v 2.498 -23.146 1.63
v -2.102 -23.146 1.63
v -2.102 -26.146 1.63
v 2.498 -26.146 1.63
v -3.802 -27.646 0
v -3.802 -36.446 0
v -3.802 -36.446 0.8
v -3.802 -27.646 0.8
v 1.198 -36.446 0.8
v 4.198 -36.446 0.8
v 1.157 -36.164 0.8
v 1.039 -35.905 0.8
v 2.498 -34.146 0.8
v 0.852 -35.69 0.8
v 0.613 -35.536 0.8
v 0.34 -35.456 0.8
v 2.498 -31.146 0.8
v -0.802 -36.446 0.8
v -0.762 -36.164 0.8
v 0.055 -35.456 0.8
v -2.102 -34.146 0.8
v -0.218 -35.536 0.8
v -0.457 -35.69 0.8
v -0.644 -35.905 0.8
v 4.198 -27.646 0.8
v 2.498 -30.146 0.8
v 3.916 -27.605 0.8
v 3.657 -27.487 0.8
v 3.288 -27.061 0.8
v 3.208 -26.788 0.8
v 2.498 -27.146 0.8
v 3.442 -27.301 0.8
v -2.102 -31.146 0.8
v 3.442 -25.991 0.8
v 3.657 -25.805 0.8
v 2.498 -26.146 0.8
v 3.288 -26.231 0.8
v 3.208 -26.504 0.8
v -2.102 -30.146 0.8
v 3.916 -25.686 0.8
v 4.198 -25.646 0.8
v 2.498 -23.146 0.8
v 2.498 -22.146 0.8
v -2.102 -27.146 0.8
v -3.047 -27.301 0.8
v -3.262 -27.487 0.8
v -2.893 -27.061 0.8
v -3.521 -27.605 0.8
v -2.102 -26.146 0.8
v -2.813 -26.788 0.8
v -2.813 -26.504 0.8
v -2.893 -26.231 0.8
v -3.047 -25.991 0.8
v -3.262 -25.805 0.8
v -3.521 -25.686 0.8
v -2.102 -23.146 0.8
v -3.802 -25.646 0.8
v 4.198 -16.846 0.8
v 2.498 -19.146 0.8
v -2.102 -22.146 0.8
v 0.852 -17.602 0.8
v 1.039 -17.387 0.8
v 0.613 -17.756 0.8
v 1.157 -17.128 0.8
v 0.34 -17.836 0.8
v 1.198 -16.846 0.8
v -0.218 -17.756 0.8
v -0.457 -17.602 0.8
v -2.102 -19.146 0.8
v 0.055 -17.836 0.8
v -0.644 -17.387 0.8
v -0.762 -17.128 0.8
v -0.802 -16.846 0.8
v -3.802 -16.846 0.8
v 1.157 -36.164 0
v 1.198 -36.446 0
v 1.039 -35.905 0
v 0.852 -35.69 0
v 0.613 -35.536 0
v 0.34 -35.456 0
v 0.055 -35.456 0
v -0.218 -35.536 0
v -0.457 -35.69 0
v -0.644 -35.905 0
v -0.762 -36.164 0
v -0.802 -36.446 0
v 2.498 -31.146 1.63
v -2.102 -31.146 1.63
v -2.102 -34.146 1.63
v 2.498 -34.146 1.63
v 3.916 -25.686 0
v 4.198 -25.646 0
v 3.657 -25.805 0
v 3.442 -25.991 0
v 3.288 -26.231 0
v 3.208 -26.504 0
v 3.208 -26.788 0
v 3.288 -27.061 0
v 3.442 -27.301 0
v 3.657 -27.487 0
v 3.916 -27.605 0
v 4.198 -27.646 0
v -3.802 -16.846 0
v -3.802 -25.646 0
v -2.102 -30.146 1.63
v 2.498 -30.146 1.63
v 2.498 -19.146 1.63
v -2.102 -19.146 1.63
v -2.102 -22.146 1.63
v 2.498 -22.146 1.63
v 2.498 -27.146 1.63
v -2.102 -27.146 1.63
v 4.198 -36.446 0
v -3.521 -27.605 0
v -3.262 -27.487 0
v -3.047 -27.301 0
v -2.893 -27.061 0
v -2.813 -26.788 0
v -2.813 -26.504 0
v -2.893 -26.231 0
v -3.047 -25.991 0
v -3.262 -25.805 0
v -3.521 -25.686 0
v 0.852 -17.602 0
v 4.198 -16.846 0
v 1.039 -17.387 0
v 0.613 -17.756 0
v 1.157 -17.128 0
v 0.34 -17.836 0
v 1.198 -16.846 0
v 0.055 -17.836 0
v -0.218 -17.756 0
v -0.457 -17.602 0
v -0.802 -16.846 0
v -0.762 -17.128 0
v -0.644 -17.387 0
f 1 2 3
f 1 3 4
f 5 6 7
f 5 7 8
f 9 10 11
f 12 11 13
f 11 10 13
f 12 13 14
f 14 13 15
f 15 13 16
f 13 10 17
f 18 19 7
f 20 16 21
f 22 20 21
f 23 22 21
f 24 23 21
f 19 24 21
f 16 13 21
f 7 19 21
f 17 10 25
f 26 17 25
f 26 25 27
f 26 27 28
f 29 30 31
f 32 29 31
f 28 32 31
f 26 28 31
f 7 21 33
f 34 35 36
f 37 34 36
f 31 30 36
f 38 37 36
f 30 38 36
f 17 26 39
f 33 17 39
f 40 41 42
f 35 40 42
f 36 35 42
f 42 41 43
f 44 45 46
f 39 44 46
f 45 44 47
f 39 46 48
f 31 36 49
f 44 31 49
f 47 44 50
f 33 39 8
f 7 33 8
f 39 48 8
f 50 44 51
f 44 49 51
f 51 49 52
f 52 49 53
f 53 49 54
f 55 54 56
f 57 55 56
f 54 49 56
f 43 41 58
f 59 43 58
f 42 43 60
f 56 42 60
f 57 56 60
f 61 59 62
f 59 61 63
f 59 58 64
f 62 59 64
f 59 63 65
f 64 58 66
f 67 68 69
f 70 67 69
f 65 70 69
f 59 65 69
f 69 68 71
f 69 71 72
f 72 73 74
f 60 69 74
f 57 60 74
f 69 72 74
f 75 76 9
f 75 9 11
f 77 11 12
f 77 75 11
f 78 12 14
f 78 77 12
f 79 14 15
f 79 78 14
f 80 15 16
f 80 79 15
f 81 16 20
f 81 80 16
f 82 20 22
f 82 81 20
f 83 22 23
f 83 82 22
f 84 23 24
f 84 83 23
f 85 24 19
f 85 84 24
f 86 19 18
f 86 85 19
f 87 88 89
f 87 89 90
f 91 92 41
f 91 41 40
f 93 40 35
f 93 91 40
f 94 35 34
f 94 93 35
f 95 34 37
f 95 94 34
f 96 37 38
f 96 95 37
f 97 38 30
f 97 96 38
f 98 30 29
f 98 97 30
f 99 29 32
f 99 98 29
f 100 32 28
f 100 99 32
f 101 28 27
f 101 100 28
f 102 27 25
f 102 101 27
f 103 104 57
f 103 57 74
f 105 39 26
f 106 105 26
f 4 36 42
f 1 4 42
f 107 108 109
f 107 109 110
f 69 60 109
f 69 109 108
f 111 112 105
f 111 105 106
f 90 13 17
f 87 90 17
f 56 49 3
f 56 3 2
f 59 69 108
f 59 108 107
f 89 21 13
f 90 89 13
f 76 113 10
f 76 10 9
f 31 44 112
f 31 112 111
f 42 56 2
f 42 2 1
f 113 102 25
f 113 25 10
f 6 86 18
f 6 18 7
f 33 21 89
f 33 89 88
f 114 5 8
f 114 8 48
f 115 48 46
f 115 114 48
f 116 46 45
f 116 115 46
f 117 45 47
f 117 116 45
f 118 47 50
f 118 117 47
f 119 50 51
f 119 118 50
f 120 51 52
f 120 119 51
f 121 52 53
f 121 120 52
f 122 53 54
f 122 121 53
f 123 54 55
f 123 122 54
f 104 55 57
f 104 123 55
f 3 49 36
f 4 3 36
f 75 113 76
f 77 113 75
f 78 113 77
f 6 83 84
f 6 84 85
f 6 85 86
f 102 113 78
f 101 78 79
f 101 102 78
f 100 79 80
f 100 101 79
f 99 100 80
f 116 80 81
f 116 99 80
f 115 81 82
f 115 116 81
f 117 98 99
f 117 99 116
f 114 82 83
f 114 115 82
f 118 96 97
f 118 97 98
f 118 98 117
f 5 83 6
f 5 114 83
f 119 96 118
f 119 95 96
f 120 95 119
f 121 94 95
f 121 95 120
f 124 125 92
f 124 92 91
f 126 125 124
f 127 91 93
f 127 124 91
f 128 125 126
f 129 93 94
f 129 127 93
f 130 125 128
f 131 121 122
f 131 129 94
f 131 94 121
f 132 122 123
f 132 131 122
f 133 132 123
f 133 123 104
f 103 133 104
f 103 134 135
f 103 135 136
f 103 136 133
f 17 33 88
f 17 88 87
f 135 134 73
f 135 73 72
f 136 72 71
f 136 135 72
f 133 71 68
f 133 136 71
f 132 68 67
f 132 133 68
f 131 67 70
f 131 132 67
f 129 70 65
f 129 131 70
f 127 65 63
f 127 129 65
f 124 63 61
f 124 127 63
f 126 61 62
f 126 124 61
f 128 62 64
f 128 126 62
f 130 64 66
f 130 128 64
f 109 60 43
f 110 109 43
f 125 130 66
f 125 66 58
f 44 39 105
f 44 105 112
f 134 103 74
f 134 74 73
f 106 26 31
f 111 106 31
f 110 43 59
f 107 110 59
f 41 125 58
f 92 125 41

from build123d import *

# Parameters (mm, degrees)
EXTRUDE1_DEPTH = 0.8
SKETCH2_W      = 4.6
SKETCH2_H      = 3
EXTRUDE2_DEPTH = 0.83


with BuildPart() as part:
    # Sketch1 → Extrude1 (new body)
    with BuildSketch(Plane.XY):
        with BuildLine():
            Line((1.197612835, -16.845933624), (4.197612835, -16.845933624))
            Line((4.197612835, -16.845933624), (4.197612835, -25.645933624))
            ThreePointArc((4.197612835, -25.645933624), (3.197612835, -26.645933624), (4.197612835, -27.645933624))
            Line((4.197612835, -27.645933624), (4.197612835, -36.445933624))
            Line((4.197612835, -36.445933624), (1.197612835, -36.445933624))
            ThreePointArc((1.197612835, -36.445933624), (0.197612835, -35.445933624), (-0.802387165, -36.445933624))
            Line((-0.802387165, -36.445933624), (-3.802387165, -36.445933624))
            Line((-3.802387165, -36.445933624), (-3.802387165, -27.645933624))
            ThreePointArc((-3.802387165, -27.645933624), (-2.802387165, -26.645933624), (-3.802387165, -25.645933624))
            Line((-3.802387165, -25.645933624), (-3.802387165, -16.845933624))
            Line((-3.802387165, -16.845933624), (-0.802387165, -16.845933624))
            ThreePointArc((-0.802387165, -16.845933624), (0.197612835, -17.845933624), (1.197612835, -16.845933624))
        make_face()
    extrude(amount=EXTRUDE1_DEPTH)

    # Sketch2 → Extrude2 (add)
    with BuildSketch(Plane.XY.offset(0.8)):
        with Locations((0.197612835, -20.645933624)):
            Rectangle(SKETCH2_W, SKETCH2_H)
        with Locations((0.197612835, -32.645933624)):
            Rectangle(SKETCH2_W, SKETCH2_H)
        with Locations((0.197612835, -24.645933624)):
            Rectangle(SKETCH2_W, SKETCH2_H)
        with Locations((0.197612835, -28.645933624)):
            Rectangle(SKETCH2_W, SKETCH2_H)
    extrude(amount=EXTRUDE2_DEPTH)


solid = part.part
